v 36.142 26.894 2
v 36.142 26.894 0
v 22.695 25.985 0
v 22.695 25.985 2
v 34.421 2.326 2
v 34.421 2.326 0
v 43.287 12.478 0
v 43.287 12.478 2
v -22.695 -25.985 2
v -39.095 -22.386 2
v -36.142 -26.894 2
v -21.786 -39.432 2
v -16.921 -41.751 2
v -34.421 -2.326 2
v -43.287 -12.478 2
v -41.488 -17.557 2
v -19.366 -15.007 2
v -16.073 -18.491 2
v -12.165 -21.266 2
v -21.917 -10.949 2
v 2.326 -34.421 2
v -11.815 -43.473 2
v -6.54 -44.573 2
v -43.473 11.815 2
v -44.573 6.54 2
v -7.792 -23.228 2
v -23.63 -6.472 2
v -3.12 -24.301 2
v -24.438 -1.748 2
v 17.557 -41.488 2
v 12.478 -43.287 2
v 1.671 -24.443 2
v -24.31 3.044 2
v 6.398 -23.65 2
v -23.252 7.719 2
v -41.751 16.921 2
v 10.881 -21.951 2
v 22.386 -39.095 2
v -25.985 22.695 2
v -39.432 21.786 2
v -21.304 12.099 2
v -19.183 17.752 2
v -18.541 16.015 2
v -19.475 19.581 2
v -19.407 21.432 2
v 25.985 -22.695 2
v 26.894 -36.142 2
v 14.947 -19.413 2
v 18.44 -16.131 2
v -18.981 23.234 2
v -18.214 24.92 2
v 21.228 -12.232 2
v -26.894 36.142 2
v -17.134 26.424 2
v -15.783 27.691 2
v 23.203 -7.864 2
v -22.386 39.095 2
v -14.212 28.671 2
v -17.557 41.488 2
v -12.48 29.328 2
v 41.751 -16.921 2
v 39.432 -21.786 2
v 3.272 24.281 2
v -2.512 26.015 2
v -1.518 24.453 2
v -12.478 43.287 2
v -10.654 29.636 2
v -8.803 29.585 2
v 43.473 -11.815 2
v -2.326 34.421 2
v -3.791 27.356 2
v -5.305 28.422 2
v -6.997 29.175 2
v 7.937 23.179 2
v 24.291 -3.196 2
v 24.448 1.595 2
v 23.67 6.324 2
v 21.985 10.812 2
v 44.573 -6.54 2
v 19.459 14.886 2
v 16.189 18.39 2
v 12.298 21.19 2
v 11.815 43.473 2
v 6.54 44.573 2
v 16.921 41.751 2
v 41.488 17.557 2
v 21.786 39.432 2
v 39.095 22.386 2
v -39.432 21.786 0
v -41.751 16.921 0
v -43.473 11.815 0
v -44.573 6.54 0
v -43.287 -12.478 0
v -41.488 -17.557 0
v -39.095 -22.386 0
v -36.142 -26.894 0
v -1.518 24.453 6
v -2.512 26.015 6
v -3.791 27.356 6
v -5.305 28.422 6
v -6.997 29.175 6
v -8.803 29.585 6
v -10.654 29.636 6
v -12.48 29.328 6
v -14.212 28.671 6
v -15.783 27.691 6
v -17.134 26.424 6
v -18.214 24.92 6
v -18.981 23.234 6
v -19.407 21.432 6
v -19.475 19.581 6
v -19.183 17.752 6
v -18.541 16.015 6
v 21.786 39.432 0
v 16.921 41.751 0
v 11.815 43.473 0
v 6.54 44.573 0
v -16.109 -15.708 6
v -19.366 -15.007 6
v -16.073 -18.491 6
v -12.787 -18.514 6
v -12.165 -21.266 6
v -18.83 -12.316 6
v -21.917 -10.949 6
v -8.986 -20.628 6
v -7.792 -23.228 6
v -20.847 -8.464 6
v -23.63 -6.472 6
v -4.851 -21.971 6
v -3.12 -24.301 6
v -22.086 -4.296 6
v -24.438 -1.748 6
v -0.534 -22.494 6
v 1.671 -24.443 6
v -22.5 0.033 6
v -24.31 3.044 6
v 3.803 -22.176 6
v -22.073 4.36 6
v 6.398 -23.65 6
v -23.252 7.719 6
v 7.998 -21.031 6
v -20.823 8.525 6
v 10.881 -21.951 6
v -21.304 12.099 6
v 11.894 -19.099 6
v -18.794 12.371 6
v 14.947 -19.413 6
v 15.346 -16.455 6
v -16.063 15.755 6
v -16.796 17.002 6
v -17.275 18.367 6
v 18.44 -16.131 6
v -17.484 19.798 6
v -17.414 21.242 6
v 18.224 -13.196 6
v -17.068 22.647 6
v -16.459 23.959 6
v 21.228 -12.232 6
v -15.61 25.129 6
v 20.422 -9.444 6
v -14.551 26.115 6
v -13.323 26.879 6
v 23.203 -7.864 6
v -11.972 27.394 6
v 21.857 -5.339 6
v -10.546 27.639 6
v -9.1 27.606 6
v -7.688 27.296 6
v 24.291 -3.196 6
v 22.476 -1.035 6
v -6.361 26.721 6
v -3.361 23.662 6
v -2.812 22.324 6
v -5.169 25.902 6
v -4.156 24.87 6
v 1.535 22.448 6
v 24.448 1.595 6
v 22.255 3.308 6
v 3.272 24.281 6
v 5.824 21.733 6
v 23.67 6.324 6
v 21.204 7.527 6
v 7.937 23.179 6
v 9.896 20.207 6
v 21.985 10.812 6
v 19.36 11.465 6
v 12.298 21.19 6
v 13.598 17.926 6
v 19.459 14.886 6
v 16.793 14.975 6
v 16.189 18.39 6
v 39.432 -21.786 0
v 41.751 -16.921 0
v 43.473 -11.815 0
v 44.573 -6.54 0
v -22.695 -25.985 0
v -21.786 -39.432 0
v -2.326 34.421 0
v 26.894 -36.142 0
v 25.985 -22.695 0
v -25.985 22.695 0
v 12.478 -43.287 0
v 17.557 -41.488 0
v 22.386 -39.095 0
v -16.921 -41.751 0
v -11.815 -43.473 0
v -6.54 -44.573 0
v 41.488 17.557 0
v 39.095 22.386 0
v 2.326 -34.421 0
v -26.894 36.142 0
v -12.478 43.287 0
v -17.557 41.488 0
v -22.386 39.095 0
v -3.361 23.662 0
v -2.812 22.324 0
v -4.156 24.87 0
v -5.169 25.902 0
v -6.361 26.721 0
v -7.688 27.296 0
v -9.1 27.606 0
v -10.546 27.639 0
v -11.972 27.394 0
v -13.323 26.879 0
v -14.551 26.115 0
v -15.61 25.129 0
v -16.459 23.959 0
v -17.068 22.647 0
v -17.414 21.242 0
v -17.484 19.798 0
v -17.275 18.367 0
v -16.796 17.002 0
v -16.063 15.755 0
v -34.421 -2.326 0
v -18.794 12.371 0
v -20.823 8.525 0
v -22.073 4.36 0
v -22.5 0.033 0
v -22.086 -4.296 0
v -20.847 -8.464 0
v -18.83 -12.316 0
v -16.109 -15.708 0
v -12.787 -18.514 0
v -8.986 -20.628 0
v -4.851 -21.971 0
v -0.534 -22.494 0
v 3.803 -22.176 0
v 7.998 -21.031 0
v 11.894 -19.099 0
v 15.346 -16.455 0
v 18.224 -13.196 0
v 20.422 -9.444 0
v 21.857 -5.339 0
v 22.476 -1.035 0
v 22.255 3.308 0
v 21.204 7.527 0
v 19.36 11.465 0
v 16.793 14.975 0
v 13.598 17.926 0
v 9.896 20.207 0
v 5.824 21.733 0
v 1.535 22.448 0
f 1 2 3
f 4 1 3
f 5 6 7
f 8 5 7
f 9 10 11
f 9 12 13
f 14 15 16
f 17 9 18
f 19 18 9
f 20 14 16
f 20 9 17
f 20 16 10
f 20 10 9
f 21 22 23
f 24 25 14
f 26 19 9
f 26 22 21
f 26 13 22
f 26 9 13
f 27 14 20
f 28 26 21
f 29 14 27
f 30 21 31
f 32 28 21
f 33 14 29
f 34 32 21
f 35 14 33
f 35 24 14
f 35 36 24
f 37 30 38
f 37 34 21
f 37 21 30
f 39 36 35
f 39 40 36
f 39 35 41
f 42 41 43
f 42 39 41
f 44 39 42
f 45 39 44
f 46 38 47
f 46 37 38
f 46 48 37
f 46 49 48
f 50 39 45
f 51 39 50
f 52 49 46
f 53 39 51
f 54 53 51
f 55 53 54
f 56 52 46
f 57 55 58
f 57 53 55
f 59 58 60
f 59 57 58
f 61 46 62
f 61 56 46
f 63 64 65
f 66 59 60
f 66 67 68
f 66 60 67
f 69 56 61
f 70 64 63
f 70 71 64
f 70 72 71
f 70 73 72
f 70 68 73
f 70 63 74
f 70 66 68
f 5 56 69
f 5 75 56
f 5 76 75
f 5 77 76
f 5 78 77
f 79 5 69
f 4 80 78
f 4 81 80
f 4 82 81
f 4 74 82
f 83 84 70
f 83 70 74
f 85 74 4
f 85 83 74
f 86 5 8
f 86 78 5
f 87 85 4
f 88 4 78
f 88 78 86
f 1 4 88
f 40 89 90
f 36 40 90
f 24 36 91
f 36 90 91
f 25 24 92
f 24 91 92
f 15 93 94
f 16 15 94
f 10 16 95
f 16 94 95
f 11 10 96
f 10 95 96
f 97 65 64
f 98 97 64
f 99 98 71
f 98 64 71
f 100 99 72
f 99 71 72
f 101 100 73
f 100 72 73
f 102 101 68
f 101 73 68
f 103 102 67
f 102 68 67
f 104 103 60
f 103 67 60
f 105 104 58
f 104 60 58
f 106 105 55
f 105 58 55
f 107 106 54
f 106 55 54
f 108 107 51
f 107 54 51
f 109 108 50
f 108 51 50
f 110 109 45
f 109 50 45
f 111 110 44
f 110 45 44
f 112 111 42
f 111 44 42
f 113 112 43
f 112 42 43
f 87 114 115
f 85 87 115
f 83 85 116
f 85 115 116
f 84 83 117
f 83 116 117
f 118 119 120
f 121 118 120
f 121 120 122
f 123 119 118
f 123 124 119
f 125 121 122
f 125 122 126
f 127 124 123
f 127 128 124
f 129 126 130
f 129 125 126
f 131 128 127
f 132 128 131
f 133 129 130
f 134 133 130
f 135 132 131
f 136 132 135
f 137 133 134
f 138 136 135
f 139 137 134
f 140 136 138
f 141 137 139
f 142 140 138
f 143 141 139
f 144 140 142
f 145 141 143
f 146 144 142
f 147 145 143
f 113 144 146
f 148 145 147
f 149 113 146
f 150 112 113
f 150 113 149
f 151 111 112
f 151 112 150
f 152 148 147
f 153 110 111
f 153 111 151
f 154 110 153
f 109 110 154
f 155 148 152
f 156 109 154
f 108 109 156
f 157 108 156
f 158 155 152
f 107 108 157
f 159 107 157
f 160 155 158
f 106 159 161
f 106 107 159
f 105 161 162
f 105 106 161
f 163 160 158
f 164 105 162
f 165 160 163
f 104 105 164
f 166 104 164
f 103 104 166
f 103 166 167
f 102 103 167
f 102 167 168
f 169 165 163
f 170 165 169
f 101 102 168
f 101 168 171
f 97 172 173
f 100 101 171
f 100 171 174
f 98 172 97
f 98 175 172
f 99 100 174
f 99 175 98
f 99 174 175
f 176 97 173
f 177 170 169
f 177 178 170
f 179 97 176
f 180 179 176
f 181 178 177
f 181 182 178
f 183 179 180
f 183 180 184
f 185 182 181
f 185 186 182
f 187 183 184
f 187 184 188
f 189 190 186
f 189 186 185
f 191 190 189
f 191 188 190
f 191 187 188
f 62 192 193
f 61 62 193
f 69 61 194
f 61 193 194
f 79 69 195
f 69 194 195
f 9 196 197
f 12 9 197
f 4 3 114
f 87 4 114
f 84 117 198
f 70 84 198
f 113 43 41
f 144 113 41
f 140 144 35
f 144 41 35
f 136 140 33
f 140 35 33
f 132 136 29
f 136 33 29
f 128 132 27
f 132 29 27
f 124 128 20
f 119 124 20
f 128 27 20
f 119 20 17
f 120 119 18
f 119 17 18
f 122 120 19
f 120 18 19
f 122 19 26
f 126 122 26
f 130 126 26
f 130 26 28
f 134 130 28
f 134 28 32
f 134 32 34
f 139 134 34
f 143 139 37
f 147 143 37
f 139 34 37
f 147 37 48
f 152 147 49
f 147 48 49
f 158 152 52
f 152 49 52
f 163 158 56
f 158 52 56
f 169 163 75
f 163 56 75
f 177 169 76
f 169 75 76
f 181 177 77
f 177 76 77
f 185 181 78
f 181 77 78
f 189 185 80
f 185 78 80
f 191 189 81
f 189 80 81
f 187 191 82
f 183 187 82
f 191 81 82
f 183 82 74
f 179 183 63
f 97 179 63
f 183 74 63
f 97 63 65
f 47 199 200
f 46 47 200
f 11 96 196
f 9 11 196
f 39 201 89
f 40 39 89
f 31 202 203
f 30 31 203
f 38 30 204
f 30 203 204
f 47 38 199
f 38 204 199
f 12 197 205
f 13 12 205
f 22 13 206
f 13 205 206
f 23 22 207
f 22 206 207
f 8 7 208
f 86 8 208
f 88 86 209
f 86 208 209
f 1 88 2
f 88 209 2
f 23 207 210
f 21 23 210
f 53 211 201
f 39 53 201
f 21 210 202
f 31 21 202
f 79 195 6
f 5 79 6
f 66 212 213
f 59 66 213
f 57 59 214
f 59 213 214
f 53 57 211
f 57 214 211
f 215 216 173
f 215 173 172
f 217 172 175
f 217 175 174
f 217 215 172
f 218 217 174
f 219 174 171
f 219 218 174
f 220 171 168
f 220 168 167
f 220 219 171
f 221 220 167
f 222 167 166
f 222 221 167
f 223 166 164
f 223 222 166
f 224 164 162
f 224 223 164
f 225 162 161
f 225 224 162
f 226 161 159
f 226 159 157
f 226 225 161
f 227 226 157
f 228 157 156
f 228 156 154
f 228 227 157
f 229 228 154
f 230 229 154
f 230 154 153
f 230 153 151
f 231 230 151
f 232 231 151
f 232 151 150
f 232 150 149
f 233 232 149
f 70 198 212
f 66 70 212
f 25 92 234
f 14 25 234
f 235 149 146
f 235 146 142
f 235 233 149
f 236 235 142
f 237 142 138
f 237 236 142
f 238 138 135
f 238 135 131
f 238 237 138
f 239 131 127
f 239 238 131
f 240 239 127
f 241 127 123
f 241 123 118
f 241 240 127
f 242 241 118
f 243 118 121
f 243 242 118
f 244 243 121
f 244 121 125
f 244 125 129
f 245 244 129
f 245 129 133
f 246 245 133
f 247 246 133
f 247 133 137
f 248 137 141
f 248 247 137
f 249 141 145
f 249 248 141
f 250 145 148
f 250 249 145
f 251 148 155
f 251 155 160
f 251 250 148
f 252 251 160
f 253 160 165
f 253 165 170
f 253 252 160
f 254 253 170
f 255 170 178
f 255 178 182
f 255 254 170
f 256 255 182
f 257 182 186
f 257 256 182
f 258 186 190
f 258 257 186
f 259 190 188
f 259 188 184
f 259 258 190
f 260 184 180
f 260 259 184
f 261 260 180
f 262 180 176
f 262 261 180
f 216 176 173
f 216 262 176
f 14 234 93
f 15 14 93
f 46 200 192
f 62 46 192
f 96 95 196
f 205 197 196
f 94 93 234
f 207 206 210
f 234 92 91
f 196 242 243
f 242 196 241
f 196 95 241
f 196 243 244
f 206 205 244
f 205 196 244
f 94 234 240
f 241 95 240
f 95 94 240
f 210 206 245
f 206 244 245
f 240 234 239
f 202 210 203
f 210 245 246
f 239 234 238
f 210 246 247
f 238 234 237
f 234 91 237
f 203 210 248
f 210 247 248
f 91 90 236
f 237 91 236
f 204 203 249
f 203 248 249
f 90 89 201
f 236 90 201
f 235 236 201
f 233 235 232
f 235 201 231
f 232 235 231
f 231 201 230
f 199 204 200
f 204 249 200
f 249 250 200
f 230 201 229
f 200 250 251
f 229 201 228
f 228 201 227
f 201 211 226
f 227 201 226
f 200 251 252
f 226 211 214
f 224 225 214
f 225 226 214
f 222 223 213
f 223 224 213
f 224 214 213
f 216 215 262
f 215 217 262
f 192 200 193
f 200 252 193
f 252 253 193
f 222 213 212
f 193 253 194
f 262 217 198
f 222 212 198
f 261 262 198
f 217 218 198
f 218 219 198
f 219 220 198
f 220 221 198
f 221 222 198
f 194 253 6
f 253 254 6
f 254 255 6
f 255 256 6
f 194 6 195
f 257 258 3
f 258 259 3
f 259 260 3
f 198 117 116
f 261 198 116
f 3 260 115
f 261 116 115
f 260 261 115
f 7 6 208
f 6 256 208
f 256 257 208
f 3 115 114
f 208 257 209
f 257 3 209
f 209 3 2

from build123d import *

# Parameters (mm, degrees)
BOSS_EXTRUDE1_DEPTH = 2
BOSS_EXTRUDE2_DEPTH = 4


with BuildPart() as part:
    # Sketch1 → Boss-Extrude1 (new body)
    with BuildSketch(Plane.XY):
        with BuildLine():
            Line((-6.539551855, -44.572825371), (2.326465122, -34.421469464))
            Line((2.326465122, -34.421469464), (12.47782103, -43.287486441))
            ThreePointArc((12.47782103, -43.287486441), (20.007292075, -40.363483049), (26.893585614, -36.141908539))
            Line((26.893585614, -36.141908539), (25.98471374, -22.694595212))
            Line((25.98471374, -22.694595212), (39.432027067, -21.785723338))
            ThreePointArc((39.432027067, -21.785723338), (42.688584475, -14.394000677), (44.572825371, -6.539551855))
            Line((44.572825371, -6.539551855), (34.421469464, 2.326465122))
            Line((34.421469464, 2.326465122), (43.287486441, 12.47782103))
            ThreePointArc((43.287486441, 12.47782103), (40.363483049, 20.007292075), (36.141908539, 26.893585614))
            Line((36.141908539, 26.893585614), (22.694595212, 25.98471374))
            Line((22.694595212, 25.98471374), (21.785723338, 39.432027067))
            ThreePointArc((21.785723338, 39.432027067), (14.394000677, 42.688584475), (6.539551855, 44.572825371))
            Line((6.539551855, 44.572825371), (-2.326465122, 34.421469464))
            Line((-2.326465122, 34.421469464), (-12.47782103, 43.287486441))
            ThreePointArc((-12.47782103, 43.287486441), (-20.007292075, 40.363483049), (-26.893585614, 36.141908539))
            Line((-26.893585614, 36.141908539), (-25.98471374, 22.694595212))
            Line((-25.98471374, 22.694595212), (-39.432027067, 21.785723338))
            ThreePointArc((-39.432027067, 21.785723338), (-42.688584475, 14.394000677), (-44.572825371, 6.539551855))
            Line((-44.572825371, 6.539551855), (-34.421469464, -2.326465122))
            Line((-34.421469464, -2.326465122), (-43.287486441, -12.47782103))
            ThreePointArc((-43.287486441, -12.47782103), (-40.363483049, -20.007292075), (-36.141908539, -26.893585614))
            Line((-36.141908539, -26.893585614), (-22.694595212, -25.98471374))
            Line((-22.694595212, -25.98471374), (-21.785723338, -39.432027067))
            ThreePointArc((-21.785723338, -39.432027067), (-14.394000677, -42.688584475), (-6.539551855, -44.572825371))
        make_face()
        with BuildLine():
            ThreePointArc((-16.063195097, 15.755118637), (9.992543212, -20.159342255), (-2.811608747, 22.323638956))
            ThreePointArc((-2.811608747, 22.323638956), (-13.323390949, 26.879123007), (-16.063195097, 15.755118637))
        make_face(mode=Mode.SUBTRACT)
    extrude(amount=BOSS_EXTRUDE1_DEPTH)

    # Sketch2 → Boss-Extrude2 (add)
    with BuildSketch(Plane.XY.offset(2)):
        with BuildLine():
            ThreePointArc((-1.518157826, 24.452917961), (-14.211617012, 28.671064541), (-18.540947435, 16.015095011))
            ThreePointArc((-18.540947435, 16.015095011), (10.880769275, -21.951283789), (-1.518157826, 24.452917961))
        make_face()
        with BuildLine():
            ThreePointArc((-16.063195097, 15.755118637), (9.992543212, -20.159342255), (-2.811608747, 22.323638956))
            ThreePointArc((-2.811608747, 22.323638956), (-13.323390949, 26.879123007), (-16.063195097, 15.755118637))
        make_face(mode=Mode.SUBTRACT)
    extrude(amount=BOSS_EXTRUDE2_DEPTH)


solid = part.part
